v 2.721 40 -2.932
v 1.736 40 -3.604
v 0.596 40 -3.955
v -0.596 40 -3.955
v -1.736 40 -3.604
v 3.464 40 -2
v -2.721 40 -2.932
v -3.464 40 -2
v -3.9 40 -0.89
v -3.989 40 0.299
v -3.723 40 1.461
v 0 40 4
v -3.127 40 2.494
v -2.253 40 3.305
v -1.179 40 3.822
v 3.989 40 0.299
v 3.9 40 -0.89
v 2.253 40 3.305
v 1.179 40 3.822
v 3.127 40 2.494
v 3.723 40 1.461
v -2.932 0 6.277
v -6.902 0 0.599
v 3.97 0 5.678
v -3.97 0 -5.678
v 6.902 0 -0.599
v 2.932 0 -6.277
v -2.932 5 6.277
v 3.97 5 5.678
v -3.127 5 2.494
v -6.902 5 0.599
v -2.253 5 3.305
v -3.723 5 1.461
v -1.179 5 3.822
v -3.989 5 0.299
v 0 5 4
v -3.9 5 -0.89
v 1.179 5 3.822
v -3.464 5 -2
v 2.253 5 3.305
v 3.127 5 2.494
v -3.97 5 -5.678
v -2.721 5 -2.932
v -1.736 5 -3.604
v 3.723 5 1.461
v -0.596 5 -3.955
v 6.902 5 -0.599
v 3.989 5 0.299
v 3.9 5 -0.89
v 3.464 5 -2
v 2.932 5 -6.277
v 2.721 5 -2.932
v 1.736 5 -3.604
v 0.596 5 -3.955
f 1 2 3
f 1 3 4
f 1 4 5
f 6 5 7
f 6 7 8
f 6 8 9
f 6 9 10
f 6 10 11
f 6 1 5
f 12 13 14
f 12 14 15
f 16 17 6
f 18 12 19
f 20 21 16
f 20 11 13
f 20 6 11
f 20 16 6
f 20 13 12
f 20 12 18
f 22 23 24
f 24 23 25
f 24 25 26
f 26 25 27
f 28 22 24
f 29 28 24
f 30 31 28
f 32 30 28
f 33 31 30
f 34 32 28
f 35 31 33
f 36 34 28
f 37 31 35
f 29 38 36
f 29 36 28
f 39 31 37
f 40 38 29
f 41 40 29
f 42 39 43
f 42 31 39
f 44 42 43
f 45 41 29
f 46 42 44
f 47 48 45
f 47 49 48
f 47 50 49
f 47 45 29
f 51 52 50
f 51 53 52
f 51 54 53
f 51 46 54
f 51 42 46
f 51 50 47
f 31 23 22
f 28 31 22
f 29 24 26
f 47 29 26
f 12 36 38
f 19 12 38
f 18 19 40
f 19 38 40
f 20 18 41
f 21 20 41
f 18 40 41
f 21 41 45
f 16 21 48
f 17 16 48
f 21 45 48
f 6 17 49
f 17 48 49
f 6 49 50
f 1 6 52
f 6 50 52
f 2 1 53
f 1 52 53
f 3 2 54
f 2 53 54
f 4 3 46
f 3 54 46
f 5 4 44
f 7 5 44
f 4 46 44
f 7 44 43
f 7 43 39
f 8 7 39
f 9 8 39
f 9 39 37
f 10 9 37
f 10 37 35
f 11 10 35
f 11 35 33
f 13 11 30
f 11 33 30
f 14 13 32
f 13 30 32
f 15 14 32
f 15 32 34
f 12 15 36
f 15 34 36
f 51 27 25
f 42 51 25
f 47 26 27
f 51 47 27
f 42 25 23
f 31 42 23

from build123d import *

# Parameters (mm, degrees)
BOSS_EXTRUDE1_DEPTH = 5
SKETCH2_R           = 4
BOSS_EXTRUDE2_DEPTH = 35


with BuildPart() as part:
    # Sketch1 → Boss-Extrude1 (new body)
    with BuildSketch(Plane(origin=(0, 0, 0), x_dir=(1, 0, 0), z_dir=(0, 1, 0))):
        Polygon((3.970106574, -5.677874056), (6.902236459, 0.599276121), (2.932129885, 6.277150177), (-3.970106574, 5.677874056), (-6.902236459, -0.599276121), (-2.932129885, -6.277150177), align=None)
    extrude(amount=BOSS_EXTRUDE1_DEPTH)

    # Sketch2 → Boss-Extrude2 (add)
    with BuildSketch(Plane(origin=(0, 5, 0), x_dir=(1, 0, 0), z_dir=(0, 1, 0))):
        with Locations(Location((0, 0, 0), (0, 0, 270))):
            Circle(SKETCH2_R)
    extrude(amount=BOSS_EXTRUDE2_DEPTH)


solid = part.part
